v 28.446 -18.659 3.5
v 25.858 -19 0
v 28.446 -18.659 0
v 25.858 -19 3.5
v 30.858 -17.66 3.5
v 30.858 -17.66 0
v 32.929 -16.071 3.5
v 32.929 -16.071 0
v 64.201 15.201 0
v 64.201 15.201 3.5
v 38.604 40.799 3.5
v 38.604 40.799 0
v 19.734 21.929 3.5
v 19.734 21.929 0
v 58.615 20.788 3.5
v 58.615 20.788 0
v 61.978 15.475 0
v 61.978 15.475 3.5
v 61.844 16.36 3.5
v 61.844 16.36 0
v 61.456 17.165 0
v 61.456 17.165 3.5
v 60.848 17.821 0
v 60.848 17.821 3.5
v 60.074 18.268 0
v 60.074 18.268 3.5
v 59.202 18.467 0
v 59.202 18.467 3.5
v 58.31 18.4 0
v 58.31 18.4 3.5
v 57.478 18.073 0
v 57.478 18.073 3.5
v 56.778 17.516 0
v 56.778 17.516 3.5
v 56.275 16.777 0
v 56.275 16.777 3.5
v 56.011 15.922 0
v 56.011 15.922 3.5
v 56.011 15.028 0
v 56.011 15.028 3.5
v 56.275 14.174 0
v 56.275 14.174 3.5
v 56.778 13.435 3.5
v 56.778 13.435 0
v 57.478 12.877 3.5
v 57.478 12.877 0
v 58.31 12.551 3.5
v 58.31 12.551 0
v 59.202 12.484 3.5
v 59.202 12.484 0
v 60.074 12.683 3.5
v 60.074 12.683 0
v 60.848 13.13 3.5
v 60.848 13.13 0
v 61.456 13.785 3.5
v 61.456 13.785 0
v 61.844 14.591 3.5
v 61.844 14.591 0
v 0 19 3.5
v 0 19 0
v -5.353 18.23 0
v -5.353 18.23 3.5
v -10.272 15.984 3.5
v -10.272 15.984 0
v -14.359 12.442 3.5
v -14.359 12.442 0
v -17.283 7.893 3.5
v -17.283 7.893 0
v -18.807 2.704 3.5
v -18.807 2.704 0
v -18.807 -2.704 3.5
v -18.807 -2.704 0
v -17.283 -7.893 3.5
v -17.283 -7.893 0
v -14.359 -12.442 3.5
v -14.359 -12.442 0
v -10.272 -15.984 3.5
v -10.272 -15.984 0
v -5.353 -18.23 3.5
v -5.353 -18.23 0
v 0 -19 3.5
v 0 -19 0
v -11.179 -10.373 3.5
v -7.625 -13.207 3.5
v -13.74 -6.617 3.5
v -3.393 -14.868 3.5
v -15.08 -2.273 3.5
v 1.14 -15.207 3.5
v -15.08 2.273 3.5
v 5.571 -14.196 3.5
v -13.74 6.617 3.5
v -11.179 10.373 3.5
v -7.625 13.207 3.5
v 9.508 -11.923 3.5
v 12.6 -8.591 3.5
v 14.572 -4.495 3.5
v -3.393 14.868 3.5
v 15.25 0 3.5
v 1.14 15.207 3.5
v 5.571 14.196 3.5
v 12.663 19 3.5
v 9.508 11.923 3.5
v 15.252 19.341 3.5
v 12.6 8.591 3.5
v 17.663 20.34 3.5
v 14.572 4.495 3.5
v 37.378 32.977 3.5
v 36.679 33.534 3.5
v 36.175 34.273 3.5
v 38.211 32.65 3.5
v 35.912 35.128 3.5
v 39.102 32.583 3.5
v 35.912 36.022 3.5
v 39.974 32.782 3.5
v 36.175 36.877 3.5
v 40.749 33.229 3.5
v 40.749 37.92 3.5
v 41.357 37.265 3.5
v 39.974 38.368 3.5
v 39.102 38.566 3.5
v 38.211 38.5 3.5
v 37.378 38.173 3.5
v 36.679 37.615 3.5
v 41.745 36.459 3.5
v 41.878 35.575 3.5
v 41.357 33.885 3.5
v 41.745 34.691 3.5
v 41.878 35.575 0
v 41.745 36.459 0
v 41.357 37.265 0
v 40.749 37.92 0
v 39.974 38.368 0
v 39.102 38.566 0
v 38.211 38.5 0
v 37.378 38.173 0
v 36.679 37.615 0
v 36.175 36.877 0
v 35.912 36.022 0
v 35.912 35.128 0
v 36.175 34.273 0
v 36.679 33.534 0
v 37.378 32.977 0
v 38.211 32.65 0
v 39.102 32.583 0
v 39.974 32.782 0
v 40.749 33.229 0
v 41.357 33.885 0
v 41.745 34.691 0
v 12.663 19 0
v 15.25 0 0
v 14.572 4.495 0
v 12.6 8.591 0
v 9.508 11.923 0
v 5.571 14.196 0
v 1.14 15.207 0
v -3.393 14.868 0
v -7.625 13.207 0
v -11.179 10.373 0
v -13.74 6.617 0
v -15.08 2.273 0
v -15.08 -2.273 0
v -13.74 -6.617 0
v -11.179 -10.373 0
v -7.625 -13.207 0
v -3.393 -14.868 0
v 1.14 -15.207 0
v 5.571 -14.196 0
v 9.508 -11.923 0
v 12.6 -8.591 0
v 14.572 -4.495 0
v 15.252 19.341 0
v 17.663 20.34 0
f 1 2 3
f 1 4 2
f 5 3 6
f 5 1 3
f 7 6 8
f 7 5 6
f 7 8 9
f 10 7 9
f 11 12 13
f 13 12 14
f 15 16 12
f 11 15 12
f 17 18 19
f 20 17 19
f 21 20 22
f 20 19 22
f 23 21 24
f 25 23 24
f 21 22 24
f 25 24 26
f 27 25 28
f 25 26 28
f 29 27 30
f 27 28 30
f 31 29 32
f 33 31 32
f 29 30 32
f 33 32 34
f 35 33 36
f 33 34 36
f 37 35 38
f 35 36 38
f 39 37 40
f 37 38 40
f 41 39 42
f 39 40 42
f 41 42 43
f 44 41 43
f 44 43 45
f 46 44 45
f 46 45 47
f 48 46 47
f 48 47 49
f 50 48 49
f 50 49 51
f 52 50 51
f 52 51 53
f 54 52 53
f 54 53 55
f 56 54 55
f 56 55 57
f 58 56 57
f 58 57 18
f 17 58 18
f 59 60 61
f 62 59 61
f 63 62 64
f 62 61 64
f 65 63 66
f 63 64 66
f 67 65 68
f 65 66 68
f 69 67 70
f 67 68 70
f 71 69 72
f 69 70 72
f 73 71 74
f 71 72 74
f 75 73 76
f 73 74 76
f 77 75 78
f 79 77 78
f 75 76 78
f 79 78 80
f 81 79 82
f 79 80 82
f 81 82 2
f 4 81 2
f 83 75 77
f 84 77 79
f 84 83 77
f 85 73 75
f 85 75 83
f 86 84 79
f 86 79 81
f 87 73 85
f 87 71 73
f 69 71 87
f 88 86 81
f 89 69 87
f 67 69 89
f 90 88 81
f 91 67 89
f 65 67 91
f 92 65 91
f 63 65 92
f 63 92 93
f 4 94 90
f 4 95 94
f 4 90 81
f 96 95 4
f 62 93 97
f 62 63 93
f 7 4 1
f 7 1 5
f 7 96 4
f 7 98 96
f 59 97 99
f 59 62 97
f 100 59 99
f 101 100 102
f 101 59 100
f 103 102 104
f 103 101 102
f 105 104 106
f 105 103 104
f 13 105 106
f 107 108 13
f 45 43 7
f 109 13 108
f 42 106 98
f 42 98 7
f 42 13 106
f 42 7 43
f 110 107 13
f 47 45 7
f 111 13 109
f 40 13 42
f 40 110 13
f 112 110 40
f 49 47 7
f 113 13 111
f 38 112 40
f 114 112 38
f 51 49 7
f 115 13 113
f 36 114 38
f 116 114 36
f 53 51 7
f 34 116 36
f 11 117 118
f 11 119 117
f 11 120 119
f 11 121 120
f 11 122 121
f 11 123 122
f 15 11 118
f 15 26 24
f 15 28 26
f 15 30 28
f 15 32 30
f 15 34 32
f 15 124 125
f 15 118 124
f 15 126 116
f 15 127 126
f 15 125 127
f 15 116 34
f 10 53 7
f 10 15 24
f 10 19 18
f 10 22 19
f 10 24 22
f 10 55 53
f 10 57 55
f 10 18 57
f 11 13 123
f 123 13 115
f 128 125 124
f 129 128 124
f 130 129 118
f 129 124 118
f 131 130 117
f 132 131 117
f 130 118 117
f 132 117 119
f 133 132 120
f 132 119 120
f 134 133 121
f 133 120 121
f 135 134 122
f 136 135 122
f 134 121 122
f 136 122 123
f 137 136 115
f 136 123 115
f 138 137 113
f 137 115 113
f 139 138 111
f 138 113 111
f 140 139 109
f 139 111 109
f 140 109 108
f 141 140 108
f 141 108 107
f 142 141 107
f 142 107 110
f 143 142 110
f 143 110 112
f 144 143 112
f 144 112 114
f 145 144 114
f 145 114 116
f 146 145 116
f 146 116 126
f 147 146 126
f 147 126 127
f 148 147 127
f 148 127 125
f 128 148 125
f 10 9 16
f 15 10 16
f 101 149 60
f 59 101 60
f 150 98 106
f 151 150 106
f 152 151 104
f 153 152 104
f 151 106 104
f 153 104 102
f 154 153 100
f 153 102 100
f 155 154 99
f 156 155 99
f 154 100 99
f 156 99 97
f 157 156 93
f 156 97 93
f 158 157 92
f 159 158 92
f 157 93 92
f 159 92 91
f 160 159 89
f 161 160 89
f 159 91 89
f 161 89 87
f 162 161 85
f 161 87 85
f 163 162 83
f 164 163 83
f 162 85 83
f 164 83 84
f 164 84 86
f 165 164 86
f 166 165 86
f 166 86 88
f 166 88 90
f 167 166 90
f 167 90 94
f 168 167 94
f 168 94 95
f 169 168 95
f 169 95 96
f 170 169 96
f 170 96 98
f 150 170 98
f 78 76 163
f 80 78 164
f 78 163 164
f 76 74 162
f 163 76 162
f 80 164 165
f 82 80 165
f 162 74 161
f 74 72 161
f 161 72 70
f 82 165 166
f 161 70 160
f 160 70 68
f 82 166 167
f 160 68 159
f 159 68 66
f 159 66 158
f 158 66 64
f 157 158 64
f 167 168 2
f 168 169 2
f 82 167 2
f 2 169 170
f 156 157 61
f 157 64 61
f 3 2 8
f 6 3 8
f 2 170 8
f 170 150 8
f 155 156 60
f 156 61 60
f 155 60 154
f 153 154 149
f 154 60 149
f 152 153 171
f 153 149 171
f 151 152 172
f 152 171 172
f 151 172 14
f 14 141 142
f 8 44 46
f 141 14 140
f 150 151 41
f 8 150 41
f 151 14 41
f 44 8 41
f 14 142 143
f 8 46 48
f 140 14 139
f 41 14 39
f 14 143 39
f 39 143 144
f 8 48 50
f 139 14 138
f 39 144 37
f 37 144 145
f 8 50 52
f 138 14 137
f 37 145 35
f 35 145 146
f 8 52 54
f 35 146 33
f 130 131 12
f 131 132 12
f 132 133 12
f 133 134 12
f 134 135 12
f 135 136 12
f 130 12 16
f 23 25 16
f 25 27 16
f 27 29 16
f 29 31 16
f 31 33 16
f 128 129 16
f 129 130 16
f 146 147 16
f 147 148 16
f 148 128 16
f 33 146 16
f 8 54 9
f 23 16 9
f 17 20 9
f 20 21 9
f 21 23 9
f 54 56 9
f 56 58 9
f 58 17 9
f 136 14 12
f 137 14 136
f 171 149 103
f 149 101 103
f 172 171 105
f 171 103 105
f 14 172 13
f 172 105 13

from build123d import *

# Parameters (mm, degrees)
SKETCH1_R           = 2.5
BOSS_EXTRUDE1_DEPTH = 3.5
SKETCH2_R           = 1.5
CUT_EXTRUDE1_DEPTH  = 77.148499601
FILLET1_R           = 10
SKETCH3_R           = 15.25
SKETCH3_R_2         = 3
CUT_EXTRUDE2_DEPTH  = 77.148499601


with BuildPart() as part:
    # Sketch1 → Boss-Extrude1 (new body)
    with BuildSketch(Plane.XY):
        with BuildLine():
            Line((0, -19), (30, -19))
            Line((30, -19), (64.201367261, 15.201367261))
            Line((64.201367261, 15.201367261), (58.615223689, 20.787510832))
            Line((58.615223689, 20.787510832), (44.190245353, 35.212489168))
            Line((44.190245353, 35.212489168), (38.604101782, 40.798632739))
            Line((38.604101782, 40.798632739), (16.805469042, 19))
            Line((16.805469042, 19), (0, 19))
            ThreePointArc((0, 19), (-19, 0), (0, -19))
        make_face()
        Circle(SKETCH1_R, mode=Mode.SUBTRACT)
    extrude(amount=BOSS_EXTRUDE1_DEPTH)

    # Sketch2 → Cut-Extrude1 (cut, through all)
    with BuildSketch(Plane.XY.offset(3.5)):
        with Locations((38.878105659, 35.574881393)):
            Circle(SKETCH2_R)
        with Locations((58.977615915, 15.475371138)):
            Circle(SKETCH2_R)
    extrude(amount=-CUT_EXTRUDE1_DEPTH, mode=Mode.SUBTRACT)

    # Fillet1
    fillet1_edges = [part.edges().sort_by_distance(p)[0] for p in [
        (16.805469042, 19, 1.75),
        (30, -19, 1.75),
    ]]
    fillet(fillet1_edges, radius=FILLET1_R)

    # Sketch3 → Cut-Extrude2 (cut, through all)
    with BuildSketch(Plane.XY.offset(3.5)):
        Circle(SKETCH3_R)
        with Locations((38.878105659, 35.574881393)):
            Circle(SKETCH3_R_2)
        with Locations((58.977615915, 15.475371138)):
            Circle(SKETCH3_R_2)
    extrude(amount=-CUT_EXTRUDE2_DEPTH, mode=Mode.SUBTRACT)


solid = part.part
